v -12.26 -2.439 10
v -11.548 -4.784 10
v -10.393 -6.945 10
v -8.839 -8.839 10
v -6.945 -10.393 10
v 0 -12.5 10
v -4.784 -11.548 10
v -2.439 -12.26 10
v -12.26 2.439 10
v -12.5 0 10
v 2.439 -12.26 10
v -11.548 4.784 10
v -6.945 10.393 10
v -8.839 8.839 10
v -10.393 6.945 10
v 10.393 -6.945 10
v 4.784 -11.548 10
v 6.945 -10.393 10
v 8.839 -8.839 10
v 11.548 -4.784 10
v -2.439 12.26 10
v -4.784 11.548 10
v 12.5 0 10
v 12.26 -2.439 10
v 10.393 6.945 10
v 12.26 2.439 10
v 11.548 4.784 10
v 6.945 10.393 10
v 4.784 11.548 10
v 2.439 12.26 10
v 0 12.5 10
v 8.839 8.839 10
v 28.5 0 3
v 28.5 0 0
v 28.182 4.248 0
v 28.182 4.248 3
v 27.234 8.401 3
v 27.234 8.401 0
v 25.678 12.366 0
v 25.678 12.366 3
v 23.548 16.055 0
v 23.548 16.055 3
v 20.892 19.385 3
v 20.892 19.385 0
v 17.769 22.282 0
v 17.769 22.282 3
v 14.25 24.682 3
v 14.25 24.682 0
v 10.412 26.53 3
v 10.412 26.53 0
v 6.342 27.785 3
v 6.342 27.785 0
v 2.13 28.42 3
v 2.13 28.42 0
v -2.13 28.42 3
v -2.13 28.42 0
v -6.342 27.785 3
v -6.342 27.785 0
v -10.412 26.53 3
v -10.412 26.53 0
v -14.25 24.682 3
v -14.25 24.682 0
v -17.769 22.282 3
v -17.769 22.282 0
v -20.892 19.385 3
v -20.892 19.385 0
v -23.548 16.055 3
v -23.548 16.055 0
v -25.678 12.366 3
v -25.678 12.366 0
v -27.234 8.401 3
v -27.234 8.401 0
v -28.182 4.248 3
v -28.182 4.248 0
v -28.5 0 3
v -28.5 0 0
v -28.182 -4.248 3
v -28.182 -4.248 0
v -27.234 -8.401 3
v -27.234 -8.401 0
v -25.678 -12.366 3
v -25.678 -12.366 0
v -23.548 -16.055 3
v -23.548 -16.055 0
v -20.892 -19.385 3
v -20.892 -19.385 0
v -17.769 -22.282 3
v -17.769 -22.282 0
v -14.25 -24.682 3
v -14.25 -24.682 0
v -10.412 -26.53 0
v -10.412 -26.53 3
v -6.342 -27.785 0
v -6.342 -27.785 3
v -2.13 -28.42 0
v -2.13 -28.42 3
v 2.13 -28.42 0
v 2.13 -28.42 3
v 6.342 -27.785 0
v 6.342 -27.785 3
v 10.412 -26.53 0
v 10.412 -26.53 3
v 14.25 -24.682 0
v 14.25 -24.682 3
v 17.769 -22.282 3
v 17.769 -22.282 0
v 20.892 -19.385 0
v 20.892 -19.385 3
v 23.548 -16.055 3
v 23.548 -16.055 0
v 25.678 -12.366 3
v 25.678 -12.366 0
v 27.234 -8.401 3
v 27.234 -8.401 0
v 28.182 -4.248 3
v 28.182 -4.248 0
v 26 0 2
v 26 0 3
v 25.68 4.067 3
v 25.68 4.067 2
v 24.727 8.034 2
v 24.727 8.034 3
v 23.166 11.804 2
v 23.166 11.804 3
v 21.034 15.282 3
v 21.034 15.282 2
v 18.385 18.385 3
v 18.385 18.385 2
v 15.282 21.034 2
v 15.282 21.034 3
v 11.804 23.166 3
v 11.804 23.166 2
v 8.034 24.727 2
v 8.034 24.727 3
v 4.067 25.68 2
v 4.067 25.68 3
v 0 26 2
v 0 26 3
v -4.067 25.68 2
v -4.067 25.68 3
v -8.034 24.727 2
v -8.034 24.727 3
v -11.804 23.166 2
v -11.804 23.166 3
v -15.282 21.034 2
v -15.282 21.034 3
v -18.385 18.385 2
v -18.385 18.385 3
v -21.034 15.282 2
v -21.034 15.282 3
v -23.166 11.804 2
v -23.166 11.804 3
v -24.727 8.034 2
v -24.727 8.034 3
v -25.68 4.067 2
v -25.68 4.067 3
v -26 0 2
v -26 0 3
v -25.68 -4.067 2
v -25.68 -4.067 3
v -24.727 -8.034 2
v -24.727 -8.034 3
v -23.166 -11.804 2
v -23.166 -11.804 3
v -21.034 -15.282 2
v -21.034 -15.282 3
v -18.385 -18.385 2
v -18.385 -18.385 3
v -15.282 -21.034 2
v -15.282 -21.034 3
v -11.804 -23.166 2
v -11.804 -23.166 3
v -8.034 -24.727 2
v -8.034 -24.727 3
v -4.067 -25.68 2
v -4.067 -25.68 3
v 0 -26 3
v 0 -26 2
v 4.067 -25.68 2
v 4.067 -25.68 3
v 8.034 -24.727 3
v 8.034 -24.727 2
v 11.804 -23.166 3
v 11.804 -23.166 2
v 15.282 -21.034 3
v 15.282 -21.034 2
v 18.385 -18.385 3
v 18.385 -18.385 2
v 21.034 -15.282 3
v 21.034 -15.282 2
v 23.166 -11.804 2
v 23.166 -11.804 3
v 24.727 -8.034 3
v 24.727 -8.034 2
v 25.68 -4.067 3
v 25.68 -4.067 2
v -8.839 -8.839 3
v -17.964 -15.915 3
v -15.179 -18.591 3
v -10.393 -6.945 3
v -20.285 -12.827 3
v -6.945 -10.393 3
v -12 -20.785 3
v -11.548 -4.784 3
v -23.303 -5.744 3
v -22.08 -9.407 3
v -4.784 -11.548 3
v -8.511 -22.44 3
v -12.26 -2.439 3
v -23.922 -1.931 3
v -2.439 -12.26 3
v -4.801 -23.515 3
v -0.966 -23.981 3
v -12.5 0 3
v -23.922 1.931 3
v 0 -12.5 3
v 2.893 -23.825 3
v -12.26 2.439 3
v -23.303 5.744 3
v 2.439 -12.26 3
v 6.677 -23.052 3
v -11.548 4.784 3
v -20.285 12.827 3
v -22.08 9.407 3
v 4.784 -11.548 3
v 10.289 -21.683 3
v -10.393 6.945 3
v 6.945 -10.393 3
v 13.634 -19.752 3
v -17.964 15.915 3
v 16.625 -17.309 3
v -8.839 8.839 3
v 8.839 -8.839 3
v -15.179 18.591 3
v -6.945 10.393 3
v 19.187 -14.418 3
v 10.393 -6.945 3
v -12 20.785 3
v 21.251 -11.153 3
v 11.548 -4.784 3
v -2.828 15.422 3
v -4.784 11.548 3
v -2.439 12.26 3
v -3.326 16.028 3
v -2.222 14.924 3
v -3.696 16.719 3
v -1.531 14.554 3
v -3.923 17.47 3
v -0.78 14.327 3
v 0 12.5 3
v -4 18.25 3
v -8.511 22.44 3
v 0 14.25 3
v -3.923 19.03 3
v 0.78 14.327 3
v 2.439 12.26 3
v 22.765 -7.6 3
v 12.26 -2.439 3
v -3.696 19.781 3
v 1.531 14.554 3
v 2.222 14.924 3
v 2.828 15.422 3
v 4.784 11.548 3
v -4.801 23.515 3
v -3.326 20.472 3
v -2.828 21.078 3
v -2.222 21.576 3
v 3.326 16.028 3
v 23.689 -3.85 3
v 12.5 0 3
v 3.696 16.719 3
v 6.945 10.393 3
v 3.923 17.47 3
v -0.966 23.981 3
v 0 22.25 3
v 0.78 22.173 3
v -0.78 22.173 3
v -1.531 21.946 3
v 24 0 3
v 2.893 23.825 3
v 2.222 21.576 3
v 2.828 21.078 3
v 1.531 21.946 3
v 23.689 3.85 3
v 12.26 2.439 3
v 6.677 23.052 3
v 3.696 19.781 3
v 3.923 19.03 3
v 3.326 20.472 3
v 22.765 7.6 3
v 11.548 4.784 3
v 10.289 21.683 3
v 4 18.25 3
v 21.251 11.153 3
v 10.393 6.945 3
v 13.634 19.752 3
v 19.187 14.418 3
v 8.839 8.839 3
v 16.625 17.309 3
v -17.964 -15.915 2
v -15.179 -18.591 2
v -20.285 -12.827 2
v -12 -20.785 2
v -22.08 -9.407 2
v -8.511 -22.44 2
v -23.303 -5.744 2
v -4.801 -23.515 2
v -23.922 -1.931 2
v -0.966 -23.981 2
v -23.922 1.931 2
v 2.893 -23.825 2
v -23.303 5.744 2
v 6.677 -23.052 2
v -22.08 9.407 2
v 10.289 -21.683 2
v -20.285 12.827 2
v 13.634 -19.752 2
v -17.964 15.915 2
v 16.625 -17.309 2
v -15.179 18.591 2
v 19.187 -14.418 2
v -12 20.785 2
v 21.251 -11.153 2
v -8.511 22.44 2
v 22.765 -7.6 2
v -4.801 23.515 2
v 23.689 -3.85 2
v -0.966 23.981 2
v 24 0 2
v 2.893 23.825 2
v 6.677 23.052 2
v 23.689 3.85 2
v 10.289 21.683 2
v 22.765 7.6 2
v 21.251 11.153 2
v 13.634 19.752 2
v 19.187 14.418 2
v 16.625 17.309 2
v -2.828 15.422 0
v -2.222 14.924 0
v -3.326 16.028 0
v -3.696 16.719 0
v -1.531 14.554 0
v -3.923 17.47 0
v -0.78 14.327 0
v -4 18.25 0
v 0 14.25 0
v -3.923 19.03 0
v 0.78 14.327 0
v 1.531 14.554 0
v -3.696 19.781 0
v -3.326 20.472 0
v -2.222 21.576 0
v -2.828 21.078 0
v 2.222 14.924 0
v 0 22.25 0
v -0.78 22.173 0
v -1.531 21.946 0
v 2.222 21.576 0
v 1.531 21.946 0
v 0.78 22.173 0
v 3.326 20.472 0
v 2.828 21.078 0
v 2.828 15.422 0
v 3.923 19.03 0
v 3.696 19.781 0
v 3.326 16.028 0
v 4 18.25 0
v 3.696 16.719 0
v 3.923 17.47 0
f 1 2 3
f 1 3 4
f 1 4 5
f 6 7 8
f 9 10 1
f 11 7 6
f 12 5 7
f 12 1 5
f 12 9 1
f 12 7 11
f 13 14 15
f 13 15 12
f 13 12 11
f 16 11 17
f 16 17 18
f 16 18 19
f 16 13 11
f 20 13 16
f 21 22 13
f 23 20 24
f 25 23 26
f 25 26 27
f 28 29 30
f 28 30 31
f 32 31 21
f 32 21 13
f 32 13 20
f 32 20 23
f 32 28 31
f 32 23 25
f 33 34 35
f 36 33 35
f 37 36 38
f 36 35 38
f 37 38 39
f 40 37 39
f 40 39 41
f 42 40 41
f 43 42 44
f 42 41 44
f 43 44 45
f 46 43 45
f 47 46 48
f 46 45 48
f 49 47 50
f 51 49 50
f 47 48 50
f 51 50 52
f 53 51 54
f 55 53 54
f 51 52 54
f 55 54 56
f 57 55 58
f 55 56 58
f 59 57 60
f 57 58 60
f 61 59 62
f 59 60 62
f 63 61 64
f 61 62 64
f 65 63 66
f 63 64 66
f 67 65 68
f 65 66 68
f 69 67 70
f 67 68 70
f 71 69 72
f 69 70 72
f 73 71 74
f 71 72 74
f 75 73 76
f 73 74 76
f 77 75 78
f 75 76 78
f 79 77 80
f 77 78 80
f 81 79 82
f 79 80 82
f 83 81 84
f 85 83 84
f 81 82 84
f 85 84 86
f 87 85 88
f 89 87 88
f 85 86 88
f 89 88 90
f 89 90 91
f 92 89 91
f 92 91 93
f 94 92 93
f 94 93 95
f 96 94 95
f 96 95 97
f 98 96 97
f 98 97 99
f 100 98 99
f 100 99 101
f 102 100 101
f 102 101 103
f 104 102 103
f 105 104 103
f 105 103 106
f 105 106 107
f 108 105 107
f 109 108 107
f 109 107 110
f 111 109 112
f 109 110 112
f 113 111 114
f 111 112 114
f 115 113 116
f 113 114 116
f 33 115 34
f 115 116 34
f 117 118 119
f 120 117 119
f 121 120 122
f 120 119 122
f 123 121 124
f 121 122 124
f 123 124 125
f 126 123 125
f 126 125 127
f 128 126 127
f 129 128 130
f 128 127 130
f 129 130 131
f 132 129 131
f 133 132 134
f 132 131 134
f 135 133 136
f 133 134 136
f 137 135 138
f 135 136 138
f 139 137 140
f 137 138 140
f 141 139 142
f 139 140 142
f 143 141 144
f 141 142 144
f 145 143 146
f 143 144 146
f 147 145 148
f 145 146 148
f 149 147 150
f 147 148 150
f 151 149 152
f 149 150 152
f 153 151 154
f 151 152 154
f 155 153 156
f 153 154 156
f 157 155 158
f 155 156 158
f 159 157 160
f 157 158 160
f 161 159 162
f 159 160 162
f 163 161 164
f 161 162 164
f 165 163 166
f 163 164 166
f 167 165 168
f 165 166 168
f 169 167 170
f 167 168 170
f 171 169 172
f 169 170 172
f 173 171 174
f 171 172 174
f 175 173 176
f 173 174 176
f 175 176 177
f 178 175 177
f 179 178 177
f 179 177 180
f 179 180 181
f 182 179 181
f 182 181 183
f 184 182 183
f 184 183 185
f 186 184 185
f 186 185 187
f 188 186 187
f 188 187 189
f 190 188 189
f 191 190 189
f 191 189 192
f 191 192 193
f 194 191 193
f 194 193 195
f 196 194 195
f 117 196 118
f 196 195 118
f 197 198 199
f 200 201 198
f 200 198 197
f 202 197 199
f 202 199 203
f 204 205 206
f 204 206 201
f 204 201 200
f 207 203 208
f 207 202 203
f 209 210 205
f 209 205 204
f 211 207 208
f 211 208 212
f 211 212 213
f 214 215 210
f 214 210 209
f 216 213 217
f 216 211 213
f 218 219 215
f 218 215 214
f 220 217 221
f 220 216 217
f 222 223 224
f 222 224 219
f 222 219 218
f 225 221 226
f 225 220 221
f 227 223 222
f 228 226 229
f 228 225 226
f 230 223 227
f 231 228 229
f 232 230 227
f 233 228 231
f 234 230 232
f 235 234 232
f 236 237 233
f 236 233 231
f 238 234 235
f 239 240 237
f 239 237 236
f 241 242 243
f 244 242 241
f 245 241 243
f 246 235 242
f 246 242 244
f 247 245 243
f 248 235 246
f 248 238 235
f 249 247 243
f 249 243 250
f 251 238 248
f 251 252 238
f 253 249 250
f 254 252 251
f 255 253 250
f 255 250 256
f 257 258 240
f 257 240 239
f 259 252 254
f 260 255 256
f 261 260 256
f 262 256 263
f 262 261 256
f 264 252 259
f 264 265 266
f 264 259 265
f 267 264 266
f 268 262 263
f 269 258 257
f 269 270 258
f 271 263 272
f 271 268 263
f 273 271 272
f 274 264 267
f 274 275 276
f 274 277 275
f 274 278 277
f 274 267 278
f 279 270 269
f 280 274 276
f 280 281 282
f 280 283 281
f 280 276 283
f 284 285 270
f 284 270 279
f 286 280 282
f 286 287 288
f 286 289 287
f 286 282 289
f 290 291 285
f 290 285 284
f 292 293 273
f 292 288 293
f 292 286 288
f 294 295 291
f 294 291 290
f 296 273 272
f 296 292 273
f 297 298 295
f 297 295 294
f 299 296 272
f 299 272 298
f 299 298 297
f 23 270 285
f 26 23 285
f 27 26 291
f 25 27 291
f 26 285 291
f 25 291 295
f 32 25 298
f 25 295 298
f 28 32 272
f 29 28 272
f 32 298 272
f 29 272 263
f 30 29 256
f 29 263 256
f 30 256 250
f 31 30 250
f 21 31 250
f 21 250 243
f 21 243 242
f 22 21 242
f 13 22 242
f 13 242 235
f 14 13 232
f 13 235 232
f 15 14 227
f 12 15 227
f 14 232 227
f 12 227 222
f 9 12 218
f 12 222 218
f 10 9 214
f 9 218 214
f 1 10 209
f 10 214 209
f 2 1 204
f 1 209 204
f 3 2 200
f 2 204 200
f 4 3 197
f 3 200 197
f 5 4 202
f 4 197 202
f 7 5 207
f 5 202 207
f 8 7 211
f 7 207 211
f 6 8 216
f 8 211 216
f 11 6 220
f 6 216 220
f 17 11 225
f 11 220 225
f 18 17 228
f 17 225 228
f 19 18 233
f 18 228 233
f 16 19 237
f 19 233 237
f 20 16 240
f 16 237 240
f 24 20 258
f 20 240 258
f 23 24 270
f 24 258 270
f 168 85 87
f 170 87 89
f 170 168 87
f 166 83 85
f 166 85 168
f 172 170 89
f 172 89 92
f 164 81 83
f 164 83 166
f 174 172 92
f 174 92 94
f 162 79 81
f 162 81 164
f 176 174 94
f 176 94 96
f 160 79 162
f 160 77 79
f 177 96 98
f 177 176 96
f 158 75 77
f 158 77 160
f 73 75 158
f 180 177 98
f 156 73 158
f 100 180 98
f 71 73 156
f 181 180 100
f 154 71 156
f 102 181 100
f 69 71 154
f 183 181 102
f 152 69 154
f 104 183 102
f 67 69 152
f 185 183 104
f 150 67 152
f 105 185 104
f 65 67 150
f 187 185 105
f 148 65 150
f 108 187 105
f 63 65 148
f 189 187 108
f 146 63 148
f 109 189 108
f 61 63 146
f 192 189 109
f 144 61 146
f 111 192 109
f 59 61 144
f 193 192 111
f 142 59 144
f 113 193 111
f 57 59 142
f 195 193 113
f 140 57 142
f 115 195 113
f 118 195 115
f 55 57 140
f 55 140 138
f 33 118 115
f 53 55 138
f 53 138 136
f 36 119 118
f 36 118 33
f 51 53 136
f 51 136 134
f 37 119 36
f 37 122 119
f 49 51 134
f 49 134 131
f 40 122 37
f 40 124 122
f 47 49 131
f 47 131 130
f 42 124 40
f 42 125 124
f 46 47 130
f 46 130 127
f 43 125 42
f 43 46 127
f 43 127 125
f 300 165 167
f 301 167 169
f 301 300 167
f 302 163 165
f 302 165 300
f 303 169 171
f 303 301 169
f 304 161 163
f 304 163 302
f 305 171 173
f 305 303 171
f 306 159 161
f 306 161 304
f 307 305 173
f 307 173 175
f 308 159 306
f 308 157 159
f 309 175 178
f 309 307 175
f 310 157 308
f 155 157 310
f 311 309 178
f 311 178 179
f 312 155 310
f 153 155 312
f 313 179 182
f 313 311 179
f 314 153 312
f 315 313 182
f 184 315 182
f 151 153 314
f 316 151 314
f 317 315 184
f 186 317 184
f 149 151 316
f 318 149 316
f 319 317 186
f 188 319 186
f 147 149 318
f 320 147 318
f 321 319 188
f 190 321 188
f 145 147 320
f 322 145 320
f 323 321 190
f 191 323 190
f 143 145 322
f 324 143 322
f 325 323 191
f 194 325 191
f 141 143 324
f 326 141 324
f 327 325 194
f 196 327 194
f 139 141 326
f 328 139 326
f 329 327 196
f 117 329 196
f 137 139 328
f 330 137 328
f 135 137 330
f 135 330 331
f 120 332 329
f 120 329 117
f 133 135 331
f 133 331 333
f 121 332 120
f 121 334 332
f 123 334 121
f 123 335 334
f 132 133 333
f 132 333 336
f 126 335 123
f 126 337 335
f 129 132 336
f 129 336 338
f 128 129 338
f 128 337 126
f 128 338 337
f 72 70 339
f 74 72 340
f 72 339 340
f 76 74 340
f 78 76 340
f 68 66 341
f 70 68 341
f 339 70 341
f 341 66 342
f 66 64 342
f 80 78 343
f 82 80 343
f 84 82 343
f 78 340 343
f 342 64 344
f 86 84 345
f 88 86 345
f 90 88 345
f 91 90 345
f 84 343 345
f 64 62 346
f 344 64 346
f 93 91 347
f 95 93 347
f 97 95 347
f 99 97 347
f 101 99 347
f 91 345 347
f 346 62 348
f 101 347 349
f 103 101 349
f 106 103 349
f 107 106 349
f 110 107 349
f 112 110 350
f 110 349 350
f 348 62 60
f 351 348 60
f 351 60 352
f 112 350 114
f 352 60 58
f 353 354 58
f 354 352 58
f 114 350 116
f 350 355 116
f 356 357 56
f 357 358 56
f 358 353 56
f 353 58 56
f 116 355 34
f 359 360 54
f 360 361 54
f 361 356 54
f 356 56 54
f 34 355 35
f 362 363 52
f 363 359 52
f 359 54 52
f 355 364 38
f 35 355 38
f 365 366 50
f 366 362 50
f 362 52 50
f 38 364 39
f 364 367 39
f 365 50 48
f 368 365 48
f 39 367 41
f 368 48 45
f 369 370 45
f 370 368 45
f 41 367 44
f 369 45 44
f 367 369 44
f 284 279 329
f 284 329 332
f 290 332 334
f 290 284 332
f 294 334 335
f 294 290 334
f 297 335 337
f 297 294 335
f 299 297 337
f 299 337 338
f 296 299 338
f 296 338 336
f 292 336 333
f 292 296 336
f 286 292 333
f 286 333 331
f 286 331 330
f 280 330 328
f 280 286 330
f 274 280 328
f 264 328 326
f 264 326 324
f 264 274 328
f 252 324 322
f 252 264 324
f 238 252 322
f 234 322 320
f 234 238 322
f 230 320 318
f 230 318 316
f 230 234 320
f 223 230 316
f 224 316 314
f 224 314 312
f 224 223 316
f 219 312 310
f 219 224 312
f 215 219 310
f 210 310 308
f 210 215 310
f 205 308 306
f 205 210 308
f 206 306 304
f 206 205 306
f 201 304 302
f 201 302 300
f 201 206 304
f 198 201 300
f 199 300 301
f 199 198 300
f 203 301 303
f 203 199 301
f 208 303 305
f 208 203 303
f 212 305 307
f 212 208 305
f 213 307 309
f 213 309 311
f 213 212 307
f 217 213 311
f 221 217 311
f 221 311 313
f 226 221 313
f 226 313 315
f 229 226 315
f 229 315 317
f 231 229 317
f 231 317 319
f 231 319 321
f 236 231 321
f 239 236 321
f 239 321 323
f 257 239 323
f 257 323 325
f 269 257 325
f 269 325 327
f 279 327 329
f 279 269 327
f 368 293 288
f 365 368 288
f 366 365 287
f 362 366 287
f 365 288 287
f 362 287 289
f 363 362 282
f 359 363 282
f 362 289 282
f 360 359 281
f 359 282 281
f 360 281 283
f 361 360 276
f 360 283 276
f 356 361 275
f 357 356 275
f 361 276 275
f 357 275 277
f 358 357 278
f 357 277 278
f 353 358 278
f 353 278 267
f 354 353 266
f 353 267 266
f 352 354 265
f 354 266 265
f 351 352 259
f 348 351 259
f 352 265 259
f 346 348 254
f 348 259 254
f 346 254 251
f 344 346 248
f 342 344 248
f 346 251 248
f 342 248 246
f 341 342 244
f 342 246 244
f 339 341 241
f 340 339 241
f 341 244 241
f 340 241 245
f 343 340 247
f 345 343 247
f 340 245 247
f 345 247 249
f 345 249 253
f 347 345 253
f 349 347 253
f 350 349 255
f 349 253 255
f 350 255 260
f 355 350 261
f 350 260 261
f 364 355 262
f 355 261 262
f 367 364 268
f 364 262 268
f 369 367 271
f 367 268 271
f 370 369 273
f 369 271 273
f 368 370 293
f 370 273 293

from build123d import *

# Parameters (mm, degrees)
F0_R     = 28.5
F1_DEPTH = 3
F2_R     = 26
F2_R_2   = 24
F3_DEPTH = 1
F4_R     = 12.5
F5_DEPTH = 7
F6_R     = 4
F7_DEPTH = 3


with BuildPart() as f1:
    # F0 (on Top) → F1 (new body)
    with BuildSketch(Plane.XY):
        Circle(F0_R)
    extrude(amount=F1_DEPTH)

    # F2 (on face) → F3 (cut)
    with BuildSketch(Plane.XY.offset(3)):
        Circle(F2_R)
        Circle(F2_R_2, mode=Mode.SUBTRACT)
    extrude(amount=-F3_DEPTH, mode=Mode.SUBTRACT)

    # F4 (on face) → F5 (join)
    with BuildSketch(Plane.XY.offset(3)):
        Circle(F4_R)
    extrude(amount=F5_DEPTH)

    # F6 (on face) → F7 (cut)
    with BuildSketch(Plane.XY.offset(3)):
        with Locations((0, 18.25)):
            Circle(F6_R)
    extrude(amount=-F7_DEPTH, mode=Mode.SUBTRACT)


solid = f1.part
